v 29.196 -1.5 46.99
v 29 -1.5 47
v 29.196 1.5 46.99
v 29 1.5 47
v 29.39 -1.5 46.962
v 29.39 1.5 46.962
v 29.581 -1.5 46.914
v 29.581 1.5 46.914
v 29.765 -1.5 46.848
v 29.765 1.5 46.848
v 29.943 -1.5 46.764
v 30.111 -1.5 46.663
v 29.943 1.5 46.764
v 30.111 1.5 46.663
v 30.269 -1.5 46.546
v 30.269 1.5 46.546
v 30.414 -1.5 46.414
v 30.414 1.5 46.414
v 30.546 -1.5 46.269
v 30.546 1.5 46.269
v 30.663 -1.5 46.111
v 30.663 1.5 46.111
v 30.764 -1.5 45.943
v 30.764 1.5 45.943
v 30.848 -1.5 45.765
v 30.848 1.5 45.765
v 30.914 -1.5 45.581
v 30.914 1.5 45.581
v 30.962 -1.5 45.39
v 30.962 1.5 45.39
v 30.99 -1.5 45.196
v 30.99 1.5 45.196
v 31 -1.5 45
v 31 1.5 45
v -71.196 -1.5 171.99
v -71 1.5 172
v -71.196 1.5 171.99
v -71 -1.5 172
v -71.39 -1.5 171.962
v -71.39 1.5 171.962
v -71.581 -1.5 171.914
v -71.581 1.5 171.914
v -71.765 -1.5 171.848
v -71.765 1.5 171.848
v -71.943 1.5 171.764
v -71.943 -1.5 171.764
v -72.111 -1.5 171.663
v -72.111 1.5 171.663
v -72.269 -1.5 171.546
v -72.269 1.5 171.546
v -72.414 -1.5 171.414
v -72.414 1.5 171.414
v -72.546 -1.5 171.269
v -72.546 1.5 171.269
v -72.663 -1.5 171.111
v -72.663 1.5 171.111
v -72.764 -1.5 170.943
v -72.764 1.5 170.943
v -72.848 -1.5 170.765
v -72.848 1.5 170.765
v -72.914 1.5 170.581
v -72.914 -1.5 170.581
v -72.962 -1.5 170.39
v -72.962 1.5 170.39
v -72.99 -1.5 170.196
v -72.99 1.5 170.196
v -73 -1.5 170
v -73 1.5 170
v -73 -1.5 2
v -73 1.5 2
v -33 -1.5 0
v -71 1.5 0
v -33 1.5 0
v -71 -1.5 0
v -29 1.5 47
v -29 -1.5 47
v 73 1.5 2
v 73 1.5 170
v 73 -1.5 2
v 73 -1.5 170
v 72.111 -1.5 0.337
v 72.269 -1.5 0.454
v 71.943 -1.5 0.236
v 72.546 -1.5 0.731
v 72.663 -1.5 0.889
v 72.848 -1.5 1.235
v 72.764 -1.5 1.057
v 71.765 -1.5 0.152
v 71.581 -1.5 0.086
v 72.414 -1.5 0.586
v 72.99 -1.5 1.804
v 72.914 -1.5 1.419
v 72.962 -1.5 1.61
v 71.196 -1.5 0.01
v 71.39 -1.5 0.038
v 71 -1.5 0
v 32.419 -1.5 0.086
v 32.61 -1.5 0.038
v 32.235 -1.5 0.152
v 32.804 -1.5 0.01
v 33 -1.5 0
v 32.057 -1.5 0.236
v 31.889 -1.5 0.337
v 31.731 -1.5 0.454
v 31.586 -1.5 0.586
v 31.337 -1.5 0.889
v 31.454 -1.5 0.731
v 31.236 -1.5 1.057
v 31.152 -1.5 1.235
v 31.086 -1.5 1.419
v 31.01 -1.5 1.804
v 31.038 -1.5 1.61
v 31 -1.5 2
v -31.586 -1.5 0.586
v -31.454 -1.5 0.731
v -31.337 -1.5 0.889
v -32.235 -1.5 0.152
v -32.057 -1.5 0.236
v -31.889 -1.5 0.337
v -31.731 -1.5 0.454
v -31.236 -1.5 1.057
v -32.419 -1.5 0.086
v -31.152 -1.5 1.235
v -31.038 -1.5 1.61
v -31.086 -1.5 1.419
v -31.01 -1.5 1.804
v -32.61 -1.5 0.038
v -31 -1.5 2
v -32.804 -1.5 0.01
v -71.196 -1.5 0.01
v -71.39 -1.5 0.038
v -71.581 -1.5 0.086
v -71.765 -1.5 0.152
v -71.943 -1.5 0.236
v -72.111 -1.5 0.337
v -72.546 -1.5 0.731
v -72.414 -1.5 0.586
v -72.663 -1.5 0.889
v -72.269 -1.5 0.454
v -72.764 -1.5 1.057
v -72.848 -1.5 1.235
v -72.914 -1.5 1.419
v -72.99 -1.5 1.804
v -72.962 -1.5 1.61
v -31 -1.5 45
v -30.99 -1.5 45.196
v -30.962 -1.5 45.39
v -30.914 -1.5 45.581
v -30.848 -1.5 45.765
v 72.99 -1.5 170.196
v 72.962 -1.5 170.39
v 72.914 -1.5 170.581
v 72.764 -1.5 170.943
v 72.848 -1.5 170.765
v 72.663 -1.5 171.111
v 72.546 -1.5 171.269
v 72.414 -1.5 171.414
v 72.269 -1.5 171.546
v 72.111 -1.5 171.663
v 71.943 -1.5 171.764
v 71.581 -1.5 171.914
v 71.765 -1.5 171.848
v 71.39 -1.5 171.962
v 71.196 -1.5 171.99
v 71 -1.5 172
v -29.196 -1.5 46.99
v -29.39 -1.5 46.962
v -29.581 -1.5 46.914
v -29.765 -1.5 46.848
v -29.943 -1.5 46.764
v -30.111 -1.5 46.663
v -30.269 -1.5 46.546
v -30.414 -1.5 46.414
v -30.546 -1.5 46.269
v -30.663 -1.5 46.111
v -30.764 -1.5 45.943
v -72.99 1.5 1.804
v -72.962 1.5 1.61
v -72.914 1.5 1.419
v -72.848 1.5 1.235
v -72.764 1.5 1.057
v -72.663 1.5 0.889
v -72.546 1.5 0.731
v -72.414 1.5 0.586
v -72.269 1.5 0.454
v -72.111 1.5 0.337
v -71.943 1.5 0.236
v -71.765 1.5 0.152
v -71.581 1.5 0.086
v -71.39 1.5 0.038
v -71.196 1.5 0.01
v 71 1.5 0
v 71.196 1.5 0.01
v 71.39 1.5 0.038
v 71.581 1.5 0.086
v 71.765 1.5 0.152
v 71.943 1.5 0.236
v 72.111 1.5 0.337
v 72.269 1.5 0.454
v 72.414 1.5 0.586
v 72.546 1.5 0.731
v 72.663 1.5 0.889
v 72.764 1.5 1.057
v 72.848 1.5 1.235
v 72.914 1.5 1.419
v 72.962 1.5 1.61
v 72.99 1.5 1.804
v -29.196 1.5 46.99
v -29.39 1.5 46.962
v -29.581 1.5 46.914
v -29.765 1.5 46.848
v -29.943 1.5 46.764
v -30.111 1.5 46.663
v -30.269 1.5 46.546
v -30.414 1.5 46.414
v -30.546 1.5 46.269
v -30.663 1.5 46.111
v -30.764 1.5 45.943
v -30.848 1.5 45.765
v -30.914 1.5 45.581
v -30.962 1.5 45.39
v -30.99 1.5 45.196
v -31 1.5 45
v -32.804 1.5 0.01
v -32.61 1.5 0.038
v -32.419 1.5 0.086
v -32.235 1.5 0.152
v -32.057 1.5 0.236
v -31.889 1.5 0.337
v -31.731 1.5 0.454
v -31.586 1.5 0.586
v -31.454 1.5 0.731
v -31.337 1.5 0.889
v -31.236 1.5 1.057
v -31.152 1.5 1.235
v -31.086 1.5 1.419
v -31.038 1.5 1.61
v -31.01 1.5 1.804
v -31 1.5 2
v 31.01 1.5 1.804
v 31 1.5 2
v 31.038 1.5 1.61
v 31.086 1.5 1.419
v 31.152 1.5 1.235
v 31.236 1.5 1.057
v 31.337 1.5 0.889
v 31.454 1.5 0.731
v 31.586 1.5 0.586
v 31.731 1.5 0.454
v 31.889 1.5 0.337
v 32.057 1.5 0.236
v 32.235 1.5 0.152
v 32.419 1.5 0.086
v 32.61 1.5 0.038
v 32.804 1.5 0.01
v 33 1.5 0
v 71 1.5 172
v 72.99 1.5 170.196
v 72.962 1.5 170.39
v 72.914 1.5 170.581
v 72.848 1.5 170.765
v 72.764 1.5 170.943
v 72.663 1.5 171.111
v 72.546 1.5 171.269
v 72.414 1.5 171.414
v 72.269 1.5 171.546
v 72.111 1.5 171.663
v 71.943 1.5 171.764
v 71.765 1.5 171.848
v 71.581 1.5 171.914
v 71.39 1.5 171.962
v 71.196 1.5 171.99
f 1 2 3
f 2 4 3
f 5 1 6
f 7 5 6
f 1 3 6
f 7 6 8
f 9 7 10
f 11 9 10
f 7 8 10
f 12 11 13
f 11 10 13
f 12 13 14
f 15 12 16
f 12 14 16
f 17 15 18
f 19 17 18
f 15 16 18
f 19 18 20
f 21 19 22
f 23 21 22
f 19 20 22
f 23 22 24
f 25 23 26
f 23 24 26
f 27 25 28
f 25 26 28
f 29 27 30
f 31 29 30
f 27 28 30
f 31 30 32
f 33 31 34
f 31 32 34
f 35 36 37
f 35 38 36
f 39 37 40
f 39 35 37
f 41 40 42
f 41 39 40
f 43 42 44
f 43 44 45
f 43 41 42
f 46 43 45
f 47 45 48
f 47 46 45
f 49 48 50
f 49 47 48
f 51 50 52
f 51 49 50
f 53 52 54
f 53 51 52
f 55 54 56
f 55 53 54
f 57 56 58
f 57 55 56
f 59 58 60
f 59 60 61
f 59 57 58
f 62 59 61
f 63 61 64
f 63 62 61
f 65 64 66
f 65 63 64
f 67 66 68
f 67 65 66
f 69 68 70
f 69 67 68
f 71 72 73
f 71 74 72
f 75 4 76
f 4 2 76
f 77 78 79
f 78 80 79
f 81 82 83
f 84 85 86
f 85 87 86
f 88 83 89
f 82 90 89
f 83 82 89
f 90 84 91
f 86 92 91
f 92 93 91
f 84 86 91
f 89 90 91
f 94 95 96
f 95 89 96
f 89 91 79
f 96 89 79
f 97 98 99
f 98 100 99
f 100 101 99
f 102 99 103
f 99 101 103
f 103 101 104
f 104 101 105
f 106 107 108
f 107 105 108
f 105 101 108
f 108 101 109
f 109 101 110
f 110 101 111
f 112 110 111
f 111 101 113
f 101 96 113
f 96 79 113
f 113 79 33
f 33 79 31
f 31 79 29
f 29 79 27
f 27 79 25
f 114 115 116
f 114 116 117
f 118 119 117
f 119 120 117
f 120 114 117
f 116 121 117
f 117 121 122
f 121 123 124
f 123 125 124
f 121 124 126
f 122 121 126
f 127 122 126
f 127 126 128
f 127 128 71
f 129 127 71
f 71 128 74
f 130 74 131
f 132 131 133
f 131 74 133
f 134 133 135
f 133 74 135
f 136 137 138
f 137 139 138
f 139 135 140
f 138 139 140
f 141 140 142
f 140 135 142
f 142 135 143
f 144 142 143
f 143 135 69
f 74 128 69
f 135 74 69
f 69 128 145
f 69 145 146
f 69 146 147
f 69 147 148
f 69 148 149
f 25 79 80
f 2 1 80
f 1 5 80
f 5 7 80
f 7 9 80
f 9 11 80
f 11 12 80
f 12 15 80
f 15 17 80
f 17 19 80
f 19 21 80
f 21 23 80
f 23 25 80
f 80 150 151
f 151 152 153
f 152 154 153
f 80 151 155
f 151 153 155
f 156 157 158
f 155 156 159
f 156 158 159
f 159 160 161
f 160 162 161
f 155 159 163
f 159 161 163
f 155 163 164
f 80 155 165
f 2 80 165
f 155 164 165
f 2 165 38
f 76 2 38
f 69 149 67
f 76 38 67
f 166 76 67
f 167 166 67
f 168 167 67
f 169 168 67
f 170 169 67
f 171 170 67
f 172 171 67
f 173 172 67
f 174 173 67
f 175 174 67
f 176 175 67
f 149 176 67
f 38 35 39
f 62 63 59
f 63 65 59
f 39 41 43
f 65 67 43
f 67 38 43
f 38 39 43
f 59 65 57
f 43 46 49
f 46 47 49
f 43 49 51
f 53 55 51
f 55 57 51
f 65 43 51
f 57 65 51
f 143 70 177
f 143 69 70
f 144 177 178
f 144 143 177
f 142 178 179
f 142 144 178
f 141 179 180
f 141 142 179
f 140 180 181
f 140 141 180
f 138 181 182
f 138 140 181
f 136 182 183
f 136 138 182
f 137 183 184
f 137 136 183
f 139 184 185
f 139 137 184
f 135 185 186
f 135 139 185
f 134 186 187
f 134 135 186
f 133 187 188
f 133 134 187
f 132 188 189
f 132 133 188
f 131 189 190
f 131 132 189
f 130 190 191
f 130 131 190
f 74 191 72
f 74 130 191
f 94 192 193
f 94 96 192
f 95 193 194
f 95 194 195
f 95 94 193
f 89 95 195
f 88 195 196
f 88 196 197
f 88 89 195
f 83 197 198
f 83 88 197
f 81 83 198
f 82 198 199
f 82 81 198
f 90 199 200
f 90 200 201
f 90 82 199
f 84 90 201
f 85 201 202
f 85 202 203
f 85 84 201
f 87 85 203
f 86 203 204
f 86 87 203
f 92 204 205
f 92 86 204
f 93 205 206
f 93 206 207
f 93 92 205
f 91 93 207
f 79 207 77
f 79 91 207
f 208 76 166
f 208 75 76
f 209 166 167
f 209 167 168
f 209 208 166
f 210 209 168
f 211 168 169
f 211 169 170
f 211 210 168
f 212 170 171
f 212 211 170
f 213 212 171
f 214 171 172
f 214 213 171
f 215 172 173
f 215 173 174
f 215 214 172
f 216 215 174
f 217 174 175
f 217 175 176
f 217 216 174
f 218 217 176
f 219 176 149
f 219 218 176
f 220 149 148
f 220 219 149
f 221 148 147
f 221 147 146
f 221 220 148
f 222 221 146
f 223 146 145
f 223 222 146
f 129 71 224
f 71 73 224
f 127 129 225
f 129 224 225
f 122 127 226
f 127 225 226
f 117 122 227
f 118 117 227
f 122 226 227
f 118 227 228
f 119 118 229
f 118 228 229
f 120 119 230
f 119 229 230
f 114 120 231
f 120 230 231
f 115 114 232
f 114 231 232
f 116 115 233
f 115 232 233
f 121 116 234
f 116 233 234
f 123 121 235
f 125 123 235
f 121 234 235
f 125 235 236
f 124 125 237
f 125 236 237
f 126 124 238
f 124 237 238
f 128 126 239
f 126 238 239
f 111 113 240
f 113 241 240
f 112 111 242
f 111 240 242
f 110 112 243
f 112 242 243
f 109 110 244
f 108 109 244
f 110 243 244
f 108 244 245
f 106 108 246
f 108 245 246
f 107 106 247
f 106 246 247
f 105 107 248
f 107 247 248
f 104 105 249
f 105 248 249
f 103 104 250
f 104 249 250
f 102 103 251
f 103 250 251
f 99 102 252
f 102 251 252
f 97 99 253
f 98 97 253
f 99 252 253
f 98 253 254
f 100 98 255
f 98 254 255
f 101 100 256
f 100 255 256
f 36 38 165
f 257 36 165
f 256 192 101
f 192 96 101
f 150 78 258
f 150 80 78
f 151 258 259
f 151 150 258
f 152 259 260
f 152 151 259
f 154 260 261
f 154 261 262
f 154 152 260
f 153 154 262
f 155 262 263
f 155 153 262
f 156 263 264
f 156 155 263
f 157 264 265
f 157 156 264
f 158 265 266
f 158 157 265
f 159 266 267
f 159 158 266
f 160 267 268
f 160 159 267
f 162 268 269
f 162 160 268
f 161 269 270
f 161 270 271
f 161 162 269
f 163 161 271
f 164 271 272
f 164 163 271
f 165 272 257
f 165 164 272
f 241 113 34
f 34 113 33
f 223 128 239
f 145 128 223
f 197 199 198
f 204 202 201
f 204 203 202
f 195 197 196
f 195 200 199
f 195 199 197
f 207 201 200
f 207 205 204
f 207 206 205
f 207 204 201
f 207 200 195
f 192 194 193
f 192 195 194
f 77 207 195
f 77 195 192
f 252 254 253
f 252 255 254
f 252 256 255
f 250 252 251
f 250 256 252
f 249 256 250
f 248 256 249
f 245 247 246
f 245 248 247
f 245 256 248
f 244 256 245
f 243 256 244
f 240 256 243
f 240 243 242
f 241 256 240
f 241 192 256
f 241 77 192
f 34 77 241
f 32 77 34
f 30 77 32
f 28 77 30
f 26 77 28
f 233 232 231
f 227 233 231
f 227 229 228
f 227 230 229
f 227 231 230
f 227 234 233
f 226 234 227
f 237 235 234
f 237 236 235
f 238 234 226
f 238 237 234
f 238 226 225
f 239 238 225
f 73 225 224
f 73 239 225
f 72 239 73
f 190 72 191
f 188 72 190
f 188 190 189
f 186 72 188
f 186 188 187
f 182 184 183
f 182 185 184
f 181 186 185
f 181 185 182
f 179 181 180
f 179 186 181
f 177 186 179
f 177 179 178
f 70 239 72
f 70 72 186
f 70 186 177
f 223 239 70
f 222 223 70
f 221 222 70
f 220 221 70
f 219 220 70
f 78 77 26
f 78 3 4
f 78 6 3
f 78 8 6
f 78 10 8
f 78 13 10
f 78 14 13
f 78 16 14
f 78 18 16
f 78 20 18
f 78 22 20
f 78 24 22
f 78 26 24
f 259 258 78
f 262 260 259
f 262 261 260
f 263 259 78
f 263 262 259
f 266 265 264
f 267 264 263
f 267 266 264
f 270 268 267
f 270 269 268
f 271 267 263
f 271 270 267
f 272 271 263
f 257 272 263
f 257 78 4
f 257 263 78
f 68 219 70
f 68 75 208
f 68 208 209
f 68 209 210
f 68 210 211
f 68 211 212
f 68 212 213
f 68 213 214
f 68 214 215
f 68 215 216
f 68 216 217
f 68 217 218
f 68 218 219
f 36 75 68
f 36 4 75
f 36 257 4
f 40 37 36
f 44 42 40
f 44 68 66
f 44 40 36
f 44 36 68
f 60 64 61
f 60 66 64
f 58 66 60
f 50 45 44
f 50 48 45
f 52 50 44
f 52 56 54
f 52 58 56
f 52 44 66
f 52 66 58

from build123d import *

# Parameters (mm, degrees)
F1_DEPTH = 1.5
F3_R     = 2


with BuildPart() as f1:
    # F0 (on Front) → F1 (new body, symmetric)
    with BuildSketch(Plane.XZ):
        Polygon((0, 47), (0, 172), (-73, 172), (-73, 0), (-31, 0), (-31, 47), align=None)
    extrude(amount=F1_DEPTH, both=True)

    # F2: F1 across plane


with BuildPart() as f1_1:
    add(f1.part)
    add(f1.part.mirror(Plane.YZ))

    # F3
    f3_edges = [f1_1.edges().sort_by_distance(p)[0] for p in [
        (73, 0, 172),
        (-73, 0, 172),
        (-31, 0, 0),
        (-73, 0, 0),
        (-31, 0, 47),
        (31, 0, 0),
        (31, 0, 47),
        (73, 0, 0),
    ]]
    fillet(f3_edges, radius=F3_R)


solid = f1_1.part
